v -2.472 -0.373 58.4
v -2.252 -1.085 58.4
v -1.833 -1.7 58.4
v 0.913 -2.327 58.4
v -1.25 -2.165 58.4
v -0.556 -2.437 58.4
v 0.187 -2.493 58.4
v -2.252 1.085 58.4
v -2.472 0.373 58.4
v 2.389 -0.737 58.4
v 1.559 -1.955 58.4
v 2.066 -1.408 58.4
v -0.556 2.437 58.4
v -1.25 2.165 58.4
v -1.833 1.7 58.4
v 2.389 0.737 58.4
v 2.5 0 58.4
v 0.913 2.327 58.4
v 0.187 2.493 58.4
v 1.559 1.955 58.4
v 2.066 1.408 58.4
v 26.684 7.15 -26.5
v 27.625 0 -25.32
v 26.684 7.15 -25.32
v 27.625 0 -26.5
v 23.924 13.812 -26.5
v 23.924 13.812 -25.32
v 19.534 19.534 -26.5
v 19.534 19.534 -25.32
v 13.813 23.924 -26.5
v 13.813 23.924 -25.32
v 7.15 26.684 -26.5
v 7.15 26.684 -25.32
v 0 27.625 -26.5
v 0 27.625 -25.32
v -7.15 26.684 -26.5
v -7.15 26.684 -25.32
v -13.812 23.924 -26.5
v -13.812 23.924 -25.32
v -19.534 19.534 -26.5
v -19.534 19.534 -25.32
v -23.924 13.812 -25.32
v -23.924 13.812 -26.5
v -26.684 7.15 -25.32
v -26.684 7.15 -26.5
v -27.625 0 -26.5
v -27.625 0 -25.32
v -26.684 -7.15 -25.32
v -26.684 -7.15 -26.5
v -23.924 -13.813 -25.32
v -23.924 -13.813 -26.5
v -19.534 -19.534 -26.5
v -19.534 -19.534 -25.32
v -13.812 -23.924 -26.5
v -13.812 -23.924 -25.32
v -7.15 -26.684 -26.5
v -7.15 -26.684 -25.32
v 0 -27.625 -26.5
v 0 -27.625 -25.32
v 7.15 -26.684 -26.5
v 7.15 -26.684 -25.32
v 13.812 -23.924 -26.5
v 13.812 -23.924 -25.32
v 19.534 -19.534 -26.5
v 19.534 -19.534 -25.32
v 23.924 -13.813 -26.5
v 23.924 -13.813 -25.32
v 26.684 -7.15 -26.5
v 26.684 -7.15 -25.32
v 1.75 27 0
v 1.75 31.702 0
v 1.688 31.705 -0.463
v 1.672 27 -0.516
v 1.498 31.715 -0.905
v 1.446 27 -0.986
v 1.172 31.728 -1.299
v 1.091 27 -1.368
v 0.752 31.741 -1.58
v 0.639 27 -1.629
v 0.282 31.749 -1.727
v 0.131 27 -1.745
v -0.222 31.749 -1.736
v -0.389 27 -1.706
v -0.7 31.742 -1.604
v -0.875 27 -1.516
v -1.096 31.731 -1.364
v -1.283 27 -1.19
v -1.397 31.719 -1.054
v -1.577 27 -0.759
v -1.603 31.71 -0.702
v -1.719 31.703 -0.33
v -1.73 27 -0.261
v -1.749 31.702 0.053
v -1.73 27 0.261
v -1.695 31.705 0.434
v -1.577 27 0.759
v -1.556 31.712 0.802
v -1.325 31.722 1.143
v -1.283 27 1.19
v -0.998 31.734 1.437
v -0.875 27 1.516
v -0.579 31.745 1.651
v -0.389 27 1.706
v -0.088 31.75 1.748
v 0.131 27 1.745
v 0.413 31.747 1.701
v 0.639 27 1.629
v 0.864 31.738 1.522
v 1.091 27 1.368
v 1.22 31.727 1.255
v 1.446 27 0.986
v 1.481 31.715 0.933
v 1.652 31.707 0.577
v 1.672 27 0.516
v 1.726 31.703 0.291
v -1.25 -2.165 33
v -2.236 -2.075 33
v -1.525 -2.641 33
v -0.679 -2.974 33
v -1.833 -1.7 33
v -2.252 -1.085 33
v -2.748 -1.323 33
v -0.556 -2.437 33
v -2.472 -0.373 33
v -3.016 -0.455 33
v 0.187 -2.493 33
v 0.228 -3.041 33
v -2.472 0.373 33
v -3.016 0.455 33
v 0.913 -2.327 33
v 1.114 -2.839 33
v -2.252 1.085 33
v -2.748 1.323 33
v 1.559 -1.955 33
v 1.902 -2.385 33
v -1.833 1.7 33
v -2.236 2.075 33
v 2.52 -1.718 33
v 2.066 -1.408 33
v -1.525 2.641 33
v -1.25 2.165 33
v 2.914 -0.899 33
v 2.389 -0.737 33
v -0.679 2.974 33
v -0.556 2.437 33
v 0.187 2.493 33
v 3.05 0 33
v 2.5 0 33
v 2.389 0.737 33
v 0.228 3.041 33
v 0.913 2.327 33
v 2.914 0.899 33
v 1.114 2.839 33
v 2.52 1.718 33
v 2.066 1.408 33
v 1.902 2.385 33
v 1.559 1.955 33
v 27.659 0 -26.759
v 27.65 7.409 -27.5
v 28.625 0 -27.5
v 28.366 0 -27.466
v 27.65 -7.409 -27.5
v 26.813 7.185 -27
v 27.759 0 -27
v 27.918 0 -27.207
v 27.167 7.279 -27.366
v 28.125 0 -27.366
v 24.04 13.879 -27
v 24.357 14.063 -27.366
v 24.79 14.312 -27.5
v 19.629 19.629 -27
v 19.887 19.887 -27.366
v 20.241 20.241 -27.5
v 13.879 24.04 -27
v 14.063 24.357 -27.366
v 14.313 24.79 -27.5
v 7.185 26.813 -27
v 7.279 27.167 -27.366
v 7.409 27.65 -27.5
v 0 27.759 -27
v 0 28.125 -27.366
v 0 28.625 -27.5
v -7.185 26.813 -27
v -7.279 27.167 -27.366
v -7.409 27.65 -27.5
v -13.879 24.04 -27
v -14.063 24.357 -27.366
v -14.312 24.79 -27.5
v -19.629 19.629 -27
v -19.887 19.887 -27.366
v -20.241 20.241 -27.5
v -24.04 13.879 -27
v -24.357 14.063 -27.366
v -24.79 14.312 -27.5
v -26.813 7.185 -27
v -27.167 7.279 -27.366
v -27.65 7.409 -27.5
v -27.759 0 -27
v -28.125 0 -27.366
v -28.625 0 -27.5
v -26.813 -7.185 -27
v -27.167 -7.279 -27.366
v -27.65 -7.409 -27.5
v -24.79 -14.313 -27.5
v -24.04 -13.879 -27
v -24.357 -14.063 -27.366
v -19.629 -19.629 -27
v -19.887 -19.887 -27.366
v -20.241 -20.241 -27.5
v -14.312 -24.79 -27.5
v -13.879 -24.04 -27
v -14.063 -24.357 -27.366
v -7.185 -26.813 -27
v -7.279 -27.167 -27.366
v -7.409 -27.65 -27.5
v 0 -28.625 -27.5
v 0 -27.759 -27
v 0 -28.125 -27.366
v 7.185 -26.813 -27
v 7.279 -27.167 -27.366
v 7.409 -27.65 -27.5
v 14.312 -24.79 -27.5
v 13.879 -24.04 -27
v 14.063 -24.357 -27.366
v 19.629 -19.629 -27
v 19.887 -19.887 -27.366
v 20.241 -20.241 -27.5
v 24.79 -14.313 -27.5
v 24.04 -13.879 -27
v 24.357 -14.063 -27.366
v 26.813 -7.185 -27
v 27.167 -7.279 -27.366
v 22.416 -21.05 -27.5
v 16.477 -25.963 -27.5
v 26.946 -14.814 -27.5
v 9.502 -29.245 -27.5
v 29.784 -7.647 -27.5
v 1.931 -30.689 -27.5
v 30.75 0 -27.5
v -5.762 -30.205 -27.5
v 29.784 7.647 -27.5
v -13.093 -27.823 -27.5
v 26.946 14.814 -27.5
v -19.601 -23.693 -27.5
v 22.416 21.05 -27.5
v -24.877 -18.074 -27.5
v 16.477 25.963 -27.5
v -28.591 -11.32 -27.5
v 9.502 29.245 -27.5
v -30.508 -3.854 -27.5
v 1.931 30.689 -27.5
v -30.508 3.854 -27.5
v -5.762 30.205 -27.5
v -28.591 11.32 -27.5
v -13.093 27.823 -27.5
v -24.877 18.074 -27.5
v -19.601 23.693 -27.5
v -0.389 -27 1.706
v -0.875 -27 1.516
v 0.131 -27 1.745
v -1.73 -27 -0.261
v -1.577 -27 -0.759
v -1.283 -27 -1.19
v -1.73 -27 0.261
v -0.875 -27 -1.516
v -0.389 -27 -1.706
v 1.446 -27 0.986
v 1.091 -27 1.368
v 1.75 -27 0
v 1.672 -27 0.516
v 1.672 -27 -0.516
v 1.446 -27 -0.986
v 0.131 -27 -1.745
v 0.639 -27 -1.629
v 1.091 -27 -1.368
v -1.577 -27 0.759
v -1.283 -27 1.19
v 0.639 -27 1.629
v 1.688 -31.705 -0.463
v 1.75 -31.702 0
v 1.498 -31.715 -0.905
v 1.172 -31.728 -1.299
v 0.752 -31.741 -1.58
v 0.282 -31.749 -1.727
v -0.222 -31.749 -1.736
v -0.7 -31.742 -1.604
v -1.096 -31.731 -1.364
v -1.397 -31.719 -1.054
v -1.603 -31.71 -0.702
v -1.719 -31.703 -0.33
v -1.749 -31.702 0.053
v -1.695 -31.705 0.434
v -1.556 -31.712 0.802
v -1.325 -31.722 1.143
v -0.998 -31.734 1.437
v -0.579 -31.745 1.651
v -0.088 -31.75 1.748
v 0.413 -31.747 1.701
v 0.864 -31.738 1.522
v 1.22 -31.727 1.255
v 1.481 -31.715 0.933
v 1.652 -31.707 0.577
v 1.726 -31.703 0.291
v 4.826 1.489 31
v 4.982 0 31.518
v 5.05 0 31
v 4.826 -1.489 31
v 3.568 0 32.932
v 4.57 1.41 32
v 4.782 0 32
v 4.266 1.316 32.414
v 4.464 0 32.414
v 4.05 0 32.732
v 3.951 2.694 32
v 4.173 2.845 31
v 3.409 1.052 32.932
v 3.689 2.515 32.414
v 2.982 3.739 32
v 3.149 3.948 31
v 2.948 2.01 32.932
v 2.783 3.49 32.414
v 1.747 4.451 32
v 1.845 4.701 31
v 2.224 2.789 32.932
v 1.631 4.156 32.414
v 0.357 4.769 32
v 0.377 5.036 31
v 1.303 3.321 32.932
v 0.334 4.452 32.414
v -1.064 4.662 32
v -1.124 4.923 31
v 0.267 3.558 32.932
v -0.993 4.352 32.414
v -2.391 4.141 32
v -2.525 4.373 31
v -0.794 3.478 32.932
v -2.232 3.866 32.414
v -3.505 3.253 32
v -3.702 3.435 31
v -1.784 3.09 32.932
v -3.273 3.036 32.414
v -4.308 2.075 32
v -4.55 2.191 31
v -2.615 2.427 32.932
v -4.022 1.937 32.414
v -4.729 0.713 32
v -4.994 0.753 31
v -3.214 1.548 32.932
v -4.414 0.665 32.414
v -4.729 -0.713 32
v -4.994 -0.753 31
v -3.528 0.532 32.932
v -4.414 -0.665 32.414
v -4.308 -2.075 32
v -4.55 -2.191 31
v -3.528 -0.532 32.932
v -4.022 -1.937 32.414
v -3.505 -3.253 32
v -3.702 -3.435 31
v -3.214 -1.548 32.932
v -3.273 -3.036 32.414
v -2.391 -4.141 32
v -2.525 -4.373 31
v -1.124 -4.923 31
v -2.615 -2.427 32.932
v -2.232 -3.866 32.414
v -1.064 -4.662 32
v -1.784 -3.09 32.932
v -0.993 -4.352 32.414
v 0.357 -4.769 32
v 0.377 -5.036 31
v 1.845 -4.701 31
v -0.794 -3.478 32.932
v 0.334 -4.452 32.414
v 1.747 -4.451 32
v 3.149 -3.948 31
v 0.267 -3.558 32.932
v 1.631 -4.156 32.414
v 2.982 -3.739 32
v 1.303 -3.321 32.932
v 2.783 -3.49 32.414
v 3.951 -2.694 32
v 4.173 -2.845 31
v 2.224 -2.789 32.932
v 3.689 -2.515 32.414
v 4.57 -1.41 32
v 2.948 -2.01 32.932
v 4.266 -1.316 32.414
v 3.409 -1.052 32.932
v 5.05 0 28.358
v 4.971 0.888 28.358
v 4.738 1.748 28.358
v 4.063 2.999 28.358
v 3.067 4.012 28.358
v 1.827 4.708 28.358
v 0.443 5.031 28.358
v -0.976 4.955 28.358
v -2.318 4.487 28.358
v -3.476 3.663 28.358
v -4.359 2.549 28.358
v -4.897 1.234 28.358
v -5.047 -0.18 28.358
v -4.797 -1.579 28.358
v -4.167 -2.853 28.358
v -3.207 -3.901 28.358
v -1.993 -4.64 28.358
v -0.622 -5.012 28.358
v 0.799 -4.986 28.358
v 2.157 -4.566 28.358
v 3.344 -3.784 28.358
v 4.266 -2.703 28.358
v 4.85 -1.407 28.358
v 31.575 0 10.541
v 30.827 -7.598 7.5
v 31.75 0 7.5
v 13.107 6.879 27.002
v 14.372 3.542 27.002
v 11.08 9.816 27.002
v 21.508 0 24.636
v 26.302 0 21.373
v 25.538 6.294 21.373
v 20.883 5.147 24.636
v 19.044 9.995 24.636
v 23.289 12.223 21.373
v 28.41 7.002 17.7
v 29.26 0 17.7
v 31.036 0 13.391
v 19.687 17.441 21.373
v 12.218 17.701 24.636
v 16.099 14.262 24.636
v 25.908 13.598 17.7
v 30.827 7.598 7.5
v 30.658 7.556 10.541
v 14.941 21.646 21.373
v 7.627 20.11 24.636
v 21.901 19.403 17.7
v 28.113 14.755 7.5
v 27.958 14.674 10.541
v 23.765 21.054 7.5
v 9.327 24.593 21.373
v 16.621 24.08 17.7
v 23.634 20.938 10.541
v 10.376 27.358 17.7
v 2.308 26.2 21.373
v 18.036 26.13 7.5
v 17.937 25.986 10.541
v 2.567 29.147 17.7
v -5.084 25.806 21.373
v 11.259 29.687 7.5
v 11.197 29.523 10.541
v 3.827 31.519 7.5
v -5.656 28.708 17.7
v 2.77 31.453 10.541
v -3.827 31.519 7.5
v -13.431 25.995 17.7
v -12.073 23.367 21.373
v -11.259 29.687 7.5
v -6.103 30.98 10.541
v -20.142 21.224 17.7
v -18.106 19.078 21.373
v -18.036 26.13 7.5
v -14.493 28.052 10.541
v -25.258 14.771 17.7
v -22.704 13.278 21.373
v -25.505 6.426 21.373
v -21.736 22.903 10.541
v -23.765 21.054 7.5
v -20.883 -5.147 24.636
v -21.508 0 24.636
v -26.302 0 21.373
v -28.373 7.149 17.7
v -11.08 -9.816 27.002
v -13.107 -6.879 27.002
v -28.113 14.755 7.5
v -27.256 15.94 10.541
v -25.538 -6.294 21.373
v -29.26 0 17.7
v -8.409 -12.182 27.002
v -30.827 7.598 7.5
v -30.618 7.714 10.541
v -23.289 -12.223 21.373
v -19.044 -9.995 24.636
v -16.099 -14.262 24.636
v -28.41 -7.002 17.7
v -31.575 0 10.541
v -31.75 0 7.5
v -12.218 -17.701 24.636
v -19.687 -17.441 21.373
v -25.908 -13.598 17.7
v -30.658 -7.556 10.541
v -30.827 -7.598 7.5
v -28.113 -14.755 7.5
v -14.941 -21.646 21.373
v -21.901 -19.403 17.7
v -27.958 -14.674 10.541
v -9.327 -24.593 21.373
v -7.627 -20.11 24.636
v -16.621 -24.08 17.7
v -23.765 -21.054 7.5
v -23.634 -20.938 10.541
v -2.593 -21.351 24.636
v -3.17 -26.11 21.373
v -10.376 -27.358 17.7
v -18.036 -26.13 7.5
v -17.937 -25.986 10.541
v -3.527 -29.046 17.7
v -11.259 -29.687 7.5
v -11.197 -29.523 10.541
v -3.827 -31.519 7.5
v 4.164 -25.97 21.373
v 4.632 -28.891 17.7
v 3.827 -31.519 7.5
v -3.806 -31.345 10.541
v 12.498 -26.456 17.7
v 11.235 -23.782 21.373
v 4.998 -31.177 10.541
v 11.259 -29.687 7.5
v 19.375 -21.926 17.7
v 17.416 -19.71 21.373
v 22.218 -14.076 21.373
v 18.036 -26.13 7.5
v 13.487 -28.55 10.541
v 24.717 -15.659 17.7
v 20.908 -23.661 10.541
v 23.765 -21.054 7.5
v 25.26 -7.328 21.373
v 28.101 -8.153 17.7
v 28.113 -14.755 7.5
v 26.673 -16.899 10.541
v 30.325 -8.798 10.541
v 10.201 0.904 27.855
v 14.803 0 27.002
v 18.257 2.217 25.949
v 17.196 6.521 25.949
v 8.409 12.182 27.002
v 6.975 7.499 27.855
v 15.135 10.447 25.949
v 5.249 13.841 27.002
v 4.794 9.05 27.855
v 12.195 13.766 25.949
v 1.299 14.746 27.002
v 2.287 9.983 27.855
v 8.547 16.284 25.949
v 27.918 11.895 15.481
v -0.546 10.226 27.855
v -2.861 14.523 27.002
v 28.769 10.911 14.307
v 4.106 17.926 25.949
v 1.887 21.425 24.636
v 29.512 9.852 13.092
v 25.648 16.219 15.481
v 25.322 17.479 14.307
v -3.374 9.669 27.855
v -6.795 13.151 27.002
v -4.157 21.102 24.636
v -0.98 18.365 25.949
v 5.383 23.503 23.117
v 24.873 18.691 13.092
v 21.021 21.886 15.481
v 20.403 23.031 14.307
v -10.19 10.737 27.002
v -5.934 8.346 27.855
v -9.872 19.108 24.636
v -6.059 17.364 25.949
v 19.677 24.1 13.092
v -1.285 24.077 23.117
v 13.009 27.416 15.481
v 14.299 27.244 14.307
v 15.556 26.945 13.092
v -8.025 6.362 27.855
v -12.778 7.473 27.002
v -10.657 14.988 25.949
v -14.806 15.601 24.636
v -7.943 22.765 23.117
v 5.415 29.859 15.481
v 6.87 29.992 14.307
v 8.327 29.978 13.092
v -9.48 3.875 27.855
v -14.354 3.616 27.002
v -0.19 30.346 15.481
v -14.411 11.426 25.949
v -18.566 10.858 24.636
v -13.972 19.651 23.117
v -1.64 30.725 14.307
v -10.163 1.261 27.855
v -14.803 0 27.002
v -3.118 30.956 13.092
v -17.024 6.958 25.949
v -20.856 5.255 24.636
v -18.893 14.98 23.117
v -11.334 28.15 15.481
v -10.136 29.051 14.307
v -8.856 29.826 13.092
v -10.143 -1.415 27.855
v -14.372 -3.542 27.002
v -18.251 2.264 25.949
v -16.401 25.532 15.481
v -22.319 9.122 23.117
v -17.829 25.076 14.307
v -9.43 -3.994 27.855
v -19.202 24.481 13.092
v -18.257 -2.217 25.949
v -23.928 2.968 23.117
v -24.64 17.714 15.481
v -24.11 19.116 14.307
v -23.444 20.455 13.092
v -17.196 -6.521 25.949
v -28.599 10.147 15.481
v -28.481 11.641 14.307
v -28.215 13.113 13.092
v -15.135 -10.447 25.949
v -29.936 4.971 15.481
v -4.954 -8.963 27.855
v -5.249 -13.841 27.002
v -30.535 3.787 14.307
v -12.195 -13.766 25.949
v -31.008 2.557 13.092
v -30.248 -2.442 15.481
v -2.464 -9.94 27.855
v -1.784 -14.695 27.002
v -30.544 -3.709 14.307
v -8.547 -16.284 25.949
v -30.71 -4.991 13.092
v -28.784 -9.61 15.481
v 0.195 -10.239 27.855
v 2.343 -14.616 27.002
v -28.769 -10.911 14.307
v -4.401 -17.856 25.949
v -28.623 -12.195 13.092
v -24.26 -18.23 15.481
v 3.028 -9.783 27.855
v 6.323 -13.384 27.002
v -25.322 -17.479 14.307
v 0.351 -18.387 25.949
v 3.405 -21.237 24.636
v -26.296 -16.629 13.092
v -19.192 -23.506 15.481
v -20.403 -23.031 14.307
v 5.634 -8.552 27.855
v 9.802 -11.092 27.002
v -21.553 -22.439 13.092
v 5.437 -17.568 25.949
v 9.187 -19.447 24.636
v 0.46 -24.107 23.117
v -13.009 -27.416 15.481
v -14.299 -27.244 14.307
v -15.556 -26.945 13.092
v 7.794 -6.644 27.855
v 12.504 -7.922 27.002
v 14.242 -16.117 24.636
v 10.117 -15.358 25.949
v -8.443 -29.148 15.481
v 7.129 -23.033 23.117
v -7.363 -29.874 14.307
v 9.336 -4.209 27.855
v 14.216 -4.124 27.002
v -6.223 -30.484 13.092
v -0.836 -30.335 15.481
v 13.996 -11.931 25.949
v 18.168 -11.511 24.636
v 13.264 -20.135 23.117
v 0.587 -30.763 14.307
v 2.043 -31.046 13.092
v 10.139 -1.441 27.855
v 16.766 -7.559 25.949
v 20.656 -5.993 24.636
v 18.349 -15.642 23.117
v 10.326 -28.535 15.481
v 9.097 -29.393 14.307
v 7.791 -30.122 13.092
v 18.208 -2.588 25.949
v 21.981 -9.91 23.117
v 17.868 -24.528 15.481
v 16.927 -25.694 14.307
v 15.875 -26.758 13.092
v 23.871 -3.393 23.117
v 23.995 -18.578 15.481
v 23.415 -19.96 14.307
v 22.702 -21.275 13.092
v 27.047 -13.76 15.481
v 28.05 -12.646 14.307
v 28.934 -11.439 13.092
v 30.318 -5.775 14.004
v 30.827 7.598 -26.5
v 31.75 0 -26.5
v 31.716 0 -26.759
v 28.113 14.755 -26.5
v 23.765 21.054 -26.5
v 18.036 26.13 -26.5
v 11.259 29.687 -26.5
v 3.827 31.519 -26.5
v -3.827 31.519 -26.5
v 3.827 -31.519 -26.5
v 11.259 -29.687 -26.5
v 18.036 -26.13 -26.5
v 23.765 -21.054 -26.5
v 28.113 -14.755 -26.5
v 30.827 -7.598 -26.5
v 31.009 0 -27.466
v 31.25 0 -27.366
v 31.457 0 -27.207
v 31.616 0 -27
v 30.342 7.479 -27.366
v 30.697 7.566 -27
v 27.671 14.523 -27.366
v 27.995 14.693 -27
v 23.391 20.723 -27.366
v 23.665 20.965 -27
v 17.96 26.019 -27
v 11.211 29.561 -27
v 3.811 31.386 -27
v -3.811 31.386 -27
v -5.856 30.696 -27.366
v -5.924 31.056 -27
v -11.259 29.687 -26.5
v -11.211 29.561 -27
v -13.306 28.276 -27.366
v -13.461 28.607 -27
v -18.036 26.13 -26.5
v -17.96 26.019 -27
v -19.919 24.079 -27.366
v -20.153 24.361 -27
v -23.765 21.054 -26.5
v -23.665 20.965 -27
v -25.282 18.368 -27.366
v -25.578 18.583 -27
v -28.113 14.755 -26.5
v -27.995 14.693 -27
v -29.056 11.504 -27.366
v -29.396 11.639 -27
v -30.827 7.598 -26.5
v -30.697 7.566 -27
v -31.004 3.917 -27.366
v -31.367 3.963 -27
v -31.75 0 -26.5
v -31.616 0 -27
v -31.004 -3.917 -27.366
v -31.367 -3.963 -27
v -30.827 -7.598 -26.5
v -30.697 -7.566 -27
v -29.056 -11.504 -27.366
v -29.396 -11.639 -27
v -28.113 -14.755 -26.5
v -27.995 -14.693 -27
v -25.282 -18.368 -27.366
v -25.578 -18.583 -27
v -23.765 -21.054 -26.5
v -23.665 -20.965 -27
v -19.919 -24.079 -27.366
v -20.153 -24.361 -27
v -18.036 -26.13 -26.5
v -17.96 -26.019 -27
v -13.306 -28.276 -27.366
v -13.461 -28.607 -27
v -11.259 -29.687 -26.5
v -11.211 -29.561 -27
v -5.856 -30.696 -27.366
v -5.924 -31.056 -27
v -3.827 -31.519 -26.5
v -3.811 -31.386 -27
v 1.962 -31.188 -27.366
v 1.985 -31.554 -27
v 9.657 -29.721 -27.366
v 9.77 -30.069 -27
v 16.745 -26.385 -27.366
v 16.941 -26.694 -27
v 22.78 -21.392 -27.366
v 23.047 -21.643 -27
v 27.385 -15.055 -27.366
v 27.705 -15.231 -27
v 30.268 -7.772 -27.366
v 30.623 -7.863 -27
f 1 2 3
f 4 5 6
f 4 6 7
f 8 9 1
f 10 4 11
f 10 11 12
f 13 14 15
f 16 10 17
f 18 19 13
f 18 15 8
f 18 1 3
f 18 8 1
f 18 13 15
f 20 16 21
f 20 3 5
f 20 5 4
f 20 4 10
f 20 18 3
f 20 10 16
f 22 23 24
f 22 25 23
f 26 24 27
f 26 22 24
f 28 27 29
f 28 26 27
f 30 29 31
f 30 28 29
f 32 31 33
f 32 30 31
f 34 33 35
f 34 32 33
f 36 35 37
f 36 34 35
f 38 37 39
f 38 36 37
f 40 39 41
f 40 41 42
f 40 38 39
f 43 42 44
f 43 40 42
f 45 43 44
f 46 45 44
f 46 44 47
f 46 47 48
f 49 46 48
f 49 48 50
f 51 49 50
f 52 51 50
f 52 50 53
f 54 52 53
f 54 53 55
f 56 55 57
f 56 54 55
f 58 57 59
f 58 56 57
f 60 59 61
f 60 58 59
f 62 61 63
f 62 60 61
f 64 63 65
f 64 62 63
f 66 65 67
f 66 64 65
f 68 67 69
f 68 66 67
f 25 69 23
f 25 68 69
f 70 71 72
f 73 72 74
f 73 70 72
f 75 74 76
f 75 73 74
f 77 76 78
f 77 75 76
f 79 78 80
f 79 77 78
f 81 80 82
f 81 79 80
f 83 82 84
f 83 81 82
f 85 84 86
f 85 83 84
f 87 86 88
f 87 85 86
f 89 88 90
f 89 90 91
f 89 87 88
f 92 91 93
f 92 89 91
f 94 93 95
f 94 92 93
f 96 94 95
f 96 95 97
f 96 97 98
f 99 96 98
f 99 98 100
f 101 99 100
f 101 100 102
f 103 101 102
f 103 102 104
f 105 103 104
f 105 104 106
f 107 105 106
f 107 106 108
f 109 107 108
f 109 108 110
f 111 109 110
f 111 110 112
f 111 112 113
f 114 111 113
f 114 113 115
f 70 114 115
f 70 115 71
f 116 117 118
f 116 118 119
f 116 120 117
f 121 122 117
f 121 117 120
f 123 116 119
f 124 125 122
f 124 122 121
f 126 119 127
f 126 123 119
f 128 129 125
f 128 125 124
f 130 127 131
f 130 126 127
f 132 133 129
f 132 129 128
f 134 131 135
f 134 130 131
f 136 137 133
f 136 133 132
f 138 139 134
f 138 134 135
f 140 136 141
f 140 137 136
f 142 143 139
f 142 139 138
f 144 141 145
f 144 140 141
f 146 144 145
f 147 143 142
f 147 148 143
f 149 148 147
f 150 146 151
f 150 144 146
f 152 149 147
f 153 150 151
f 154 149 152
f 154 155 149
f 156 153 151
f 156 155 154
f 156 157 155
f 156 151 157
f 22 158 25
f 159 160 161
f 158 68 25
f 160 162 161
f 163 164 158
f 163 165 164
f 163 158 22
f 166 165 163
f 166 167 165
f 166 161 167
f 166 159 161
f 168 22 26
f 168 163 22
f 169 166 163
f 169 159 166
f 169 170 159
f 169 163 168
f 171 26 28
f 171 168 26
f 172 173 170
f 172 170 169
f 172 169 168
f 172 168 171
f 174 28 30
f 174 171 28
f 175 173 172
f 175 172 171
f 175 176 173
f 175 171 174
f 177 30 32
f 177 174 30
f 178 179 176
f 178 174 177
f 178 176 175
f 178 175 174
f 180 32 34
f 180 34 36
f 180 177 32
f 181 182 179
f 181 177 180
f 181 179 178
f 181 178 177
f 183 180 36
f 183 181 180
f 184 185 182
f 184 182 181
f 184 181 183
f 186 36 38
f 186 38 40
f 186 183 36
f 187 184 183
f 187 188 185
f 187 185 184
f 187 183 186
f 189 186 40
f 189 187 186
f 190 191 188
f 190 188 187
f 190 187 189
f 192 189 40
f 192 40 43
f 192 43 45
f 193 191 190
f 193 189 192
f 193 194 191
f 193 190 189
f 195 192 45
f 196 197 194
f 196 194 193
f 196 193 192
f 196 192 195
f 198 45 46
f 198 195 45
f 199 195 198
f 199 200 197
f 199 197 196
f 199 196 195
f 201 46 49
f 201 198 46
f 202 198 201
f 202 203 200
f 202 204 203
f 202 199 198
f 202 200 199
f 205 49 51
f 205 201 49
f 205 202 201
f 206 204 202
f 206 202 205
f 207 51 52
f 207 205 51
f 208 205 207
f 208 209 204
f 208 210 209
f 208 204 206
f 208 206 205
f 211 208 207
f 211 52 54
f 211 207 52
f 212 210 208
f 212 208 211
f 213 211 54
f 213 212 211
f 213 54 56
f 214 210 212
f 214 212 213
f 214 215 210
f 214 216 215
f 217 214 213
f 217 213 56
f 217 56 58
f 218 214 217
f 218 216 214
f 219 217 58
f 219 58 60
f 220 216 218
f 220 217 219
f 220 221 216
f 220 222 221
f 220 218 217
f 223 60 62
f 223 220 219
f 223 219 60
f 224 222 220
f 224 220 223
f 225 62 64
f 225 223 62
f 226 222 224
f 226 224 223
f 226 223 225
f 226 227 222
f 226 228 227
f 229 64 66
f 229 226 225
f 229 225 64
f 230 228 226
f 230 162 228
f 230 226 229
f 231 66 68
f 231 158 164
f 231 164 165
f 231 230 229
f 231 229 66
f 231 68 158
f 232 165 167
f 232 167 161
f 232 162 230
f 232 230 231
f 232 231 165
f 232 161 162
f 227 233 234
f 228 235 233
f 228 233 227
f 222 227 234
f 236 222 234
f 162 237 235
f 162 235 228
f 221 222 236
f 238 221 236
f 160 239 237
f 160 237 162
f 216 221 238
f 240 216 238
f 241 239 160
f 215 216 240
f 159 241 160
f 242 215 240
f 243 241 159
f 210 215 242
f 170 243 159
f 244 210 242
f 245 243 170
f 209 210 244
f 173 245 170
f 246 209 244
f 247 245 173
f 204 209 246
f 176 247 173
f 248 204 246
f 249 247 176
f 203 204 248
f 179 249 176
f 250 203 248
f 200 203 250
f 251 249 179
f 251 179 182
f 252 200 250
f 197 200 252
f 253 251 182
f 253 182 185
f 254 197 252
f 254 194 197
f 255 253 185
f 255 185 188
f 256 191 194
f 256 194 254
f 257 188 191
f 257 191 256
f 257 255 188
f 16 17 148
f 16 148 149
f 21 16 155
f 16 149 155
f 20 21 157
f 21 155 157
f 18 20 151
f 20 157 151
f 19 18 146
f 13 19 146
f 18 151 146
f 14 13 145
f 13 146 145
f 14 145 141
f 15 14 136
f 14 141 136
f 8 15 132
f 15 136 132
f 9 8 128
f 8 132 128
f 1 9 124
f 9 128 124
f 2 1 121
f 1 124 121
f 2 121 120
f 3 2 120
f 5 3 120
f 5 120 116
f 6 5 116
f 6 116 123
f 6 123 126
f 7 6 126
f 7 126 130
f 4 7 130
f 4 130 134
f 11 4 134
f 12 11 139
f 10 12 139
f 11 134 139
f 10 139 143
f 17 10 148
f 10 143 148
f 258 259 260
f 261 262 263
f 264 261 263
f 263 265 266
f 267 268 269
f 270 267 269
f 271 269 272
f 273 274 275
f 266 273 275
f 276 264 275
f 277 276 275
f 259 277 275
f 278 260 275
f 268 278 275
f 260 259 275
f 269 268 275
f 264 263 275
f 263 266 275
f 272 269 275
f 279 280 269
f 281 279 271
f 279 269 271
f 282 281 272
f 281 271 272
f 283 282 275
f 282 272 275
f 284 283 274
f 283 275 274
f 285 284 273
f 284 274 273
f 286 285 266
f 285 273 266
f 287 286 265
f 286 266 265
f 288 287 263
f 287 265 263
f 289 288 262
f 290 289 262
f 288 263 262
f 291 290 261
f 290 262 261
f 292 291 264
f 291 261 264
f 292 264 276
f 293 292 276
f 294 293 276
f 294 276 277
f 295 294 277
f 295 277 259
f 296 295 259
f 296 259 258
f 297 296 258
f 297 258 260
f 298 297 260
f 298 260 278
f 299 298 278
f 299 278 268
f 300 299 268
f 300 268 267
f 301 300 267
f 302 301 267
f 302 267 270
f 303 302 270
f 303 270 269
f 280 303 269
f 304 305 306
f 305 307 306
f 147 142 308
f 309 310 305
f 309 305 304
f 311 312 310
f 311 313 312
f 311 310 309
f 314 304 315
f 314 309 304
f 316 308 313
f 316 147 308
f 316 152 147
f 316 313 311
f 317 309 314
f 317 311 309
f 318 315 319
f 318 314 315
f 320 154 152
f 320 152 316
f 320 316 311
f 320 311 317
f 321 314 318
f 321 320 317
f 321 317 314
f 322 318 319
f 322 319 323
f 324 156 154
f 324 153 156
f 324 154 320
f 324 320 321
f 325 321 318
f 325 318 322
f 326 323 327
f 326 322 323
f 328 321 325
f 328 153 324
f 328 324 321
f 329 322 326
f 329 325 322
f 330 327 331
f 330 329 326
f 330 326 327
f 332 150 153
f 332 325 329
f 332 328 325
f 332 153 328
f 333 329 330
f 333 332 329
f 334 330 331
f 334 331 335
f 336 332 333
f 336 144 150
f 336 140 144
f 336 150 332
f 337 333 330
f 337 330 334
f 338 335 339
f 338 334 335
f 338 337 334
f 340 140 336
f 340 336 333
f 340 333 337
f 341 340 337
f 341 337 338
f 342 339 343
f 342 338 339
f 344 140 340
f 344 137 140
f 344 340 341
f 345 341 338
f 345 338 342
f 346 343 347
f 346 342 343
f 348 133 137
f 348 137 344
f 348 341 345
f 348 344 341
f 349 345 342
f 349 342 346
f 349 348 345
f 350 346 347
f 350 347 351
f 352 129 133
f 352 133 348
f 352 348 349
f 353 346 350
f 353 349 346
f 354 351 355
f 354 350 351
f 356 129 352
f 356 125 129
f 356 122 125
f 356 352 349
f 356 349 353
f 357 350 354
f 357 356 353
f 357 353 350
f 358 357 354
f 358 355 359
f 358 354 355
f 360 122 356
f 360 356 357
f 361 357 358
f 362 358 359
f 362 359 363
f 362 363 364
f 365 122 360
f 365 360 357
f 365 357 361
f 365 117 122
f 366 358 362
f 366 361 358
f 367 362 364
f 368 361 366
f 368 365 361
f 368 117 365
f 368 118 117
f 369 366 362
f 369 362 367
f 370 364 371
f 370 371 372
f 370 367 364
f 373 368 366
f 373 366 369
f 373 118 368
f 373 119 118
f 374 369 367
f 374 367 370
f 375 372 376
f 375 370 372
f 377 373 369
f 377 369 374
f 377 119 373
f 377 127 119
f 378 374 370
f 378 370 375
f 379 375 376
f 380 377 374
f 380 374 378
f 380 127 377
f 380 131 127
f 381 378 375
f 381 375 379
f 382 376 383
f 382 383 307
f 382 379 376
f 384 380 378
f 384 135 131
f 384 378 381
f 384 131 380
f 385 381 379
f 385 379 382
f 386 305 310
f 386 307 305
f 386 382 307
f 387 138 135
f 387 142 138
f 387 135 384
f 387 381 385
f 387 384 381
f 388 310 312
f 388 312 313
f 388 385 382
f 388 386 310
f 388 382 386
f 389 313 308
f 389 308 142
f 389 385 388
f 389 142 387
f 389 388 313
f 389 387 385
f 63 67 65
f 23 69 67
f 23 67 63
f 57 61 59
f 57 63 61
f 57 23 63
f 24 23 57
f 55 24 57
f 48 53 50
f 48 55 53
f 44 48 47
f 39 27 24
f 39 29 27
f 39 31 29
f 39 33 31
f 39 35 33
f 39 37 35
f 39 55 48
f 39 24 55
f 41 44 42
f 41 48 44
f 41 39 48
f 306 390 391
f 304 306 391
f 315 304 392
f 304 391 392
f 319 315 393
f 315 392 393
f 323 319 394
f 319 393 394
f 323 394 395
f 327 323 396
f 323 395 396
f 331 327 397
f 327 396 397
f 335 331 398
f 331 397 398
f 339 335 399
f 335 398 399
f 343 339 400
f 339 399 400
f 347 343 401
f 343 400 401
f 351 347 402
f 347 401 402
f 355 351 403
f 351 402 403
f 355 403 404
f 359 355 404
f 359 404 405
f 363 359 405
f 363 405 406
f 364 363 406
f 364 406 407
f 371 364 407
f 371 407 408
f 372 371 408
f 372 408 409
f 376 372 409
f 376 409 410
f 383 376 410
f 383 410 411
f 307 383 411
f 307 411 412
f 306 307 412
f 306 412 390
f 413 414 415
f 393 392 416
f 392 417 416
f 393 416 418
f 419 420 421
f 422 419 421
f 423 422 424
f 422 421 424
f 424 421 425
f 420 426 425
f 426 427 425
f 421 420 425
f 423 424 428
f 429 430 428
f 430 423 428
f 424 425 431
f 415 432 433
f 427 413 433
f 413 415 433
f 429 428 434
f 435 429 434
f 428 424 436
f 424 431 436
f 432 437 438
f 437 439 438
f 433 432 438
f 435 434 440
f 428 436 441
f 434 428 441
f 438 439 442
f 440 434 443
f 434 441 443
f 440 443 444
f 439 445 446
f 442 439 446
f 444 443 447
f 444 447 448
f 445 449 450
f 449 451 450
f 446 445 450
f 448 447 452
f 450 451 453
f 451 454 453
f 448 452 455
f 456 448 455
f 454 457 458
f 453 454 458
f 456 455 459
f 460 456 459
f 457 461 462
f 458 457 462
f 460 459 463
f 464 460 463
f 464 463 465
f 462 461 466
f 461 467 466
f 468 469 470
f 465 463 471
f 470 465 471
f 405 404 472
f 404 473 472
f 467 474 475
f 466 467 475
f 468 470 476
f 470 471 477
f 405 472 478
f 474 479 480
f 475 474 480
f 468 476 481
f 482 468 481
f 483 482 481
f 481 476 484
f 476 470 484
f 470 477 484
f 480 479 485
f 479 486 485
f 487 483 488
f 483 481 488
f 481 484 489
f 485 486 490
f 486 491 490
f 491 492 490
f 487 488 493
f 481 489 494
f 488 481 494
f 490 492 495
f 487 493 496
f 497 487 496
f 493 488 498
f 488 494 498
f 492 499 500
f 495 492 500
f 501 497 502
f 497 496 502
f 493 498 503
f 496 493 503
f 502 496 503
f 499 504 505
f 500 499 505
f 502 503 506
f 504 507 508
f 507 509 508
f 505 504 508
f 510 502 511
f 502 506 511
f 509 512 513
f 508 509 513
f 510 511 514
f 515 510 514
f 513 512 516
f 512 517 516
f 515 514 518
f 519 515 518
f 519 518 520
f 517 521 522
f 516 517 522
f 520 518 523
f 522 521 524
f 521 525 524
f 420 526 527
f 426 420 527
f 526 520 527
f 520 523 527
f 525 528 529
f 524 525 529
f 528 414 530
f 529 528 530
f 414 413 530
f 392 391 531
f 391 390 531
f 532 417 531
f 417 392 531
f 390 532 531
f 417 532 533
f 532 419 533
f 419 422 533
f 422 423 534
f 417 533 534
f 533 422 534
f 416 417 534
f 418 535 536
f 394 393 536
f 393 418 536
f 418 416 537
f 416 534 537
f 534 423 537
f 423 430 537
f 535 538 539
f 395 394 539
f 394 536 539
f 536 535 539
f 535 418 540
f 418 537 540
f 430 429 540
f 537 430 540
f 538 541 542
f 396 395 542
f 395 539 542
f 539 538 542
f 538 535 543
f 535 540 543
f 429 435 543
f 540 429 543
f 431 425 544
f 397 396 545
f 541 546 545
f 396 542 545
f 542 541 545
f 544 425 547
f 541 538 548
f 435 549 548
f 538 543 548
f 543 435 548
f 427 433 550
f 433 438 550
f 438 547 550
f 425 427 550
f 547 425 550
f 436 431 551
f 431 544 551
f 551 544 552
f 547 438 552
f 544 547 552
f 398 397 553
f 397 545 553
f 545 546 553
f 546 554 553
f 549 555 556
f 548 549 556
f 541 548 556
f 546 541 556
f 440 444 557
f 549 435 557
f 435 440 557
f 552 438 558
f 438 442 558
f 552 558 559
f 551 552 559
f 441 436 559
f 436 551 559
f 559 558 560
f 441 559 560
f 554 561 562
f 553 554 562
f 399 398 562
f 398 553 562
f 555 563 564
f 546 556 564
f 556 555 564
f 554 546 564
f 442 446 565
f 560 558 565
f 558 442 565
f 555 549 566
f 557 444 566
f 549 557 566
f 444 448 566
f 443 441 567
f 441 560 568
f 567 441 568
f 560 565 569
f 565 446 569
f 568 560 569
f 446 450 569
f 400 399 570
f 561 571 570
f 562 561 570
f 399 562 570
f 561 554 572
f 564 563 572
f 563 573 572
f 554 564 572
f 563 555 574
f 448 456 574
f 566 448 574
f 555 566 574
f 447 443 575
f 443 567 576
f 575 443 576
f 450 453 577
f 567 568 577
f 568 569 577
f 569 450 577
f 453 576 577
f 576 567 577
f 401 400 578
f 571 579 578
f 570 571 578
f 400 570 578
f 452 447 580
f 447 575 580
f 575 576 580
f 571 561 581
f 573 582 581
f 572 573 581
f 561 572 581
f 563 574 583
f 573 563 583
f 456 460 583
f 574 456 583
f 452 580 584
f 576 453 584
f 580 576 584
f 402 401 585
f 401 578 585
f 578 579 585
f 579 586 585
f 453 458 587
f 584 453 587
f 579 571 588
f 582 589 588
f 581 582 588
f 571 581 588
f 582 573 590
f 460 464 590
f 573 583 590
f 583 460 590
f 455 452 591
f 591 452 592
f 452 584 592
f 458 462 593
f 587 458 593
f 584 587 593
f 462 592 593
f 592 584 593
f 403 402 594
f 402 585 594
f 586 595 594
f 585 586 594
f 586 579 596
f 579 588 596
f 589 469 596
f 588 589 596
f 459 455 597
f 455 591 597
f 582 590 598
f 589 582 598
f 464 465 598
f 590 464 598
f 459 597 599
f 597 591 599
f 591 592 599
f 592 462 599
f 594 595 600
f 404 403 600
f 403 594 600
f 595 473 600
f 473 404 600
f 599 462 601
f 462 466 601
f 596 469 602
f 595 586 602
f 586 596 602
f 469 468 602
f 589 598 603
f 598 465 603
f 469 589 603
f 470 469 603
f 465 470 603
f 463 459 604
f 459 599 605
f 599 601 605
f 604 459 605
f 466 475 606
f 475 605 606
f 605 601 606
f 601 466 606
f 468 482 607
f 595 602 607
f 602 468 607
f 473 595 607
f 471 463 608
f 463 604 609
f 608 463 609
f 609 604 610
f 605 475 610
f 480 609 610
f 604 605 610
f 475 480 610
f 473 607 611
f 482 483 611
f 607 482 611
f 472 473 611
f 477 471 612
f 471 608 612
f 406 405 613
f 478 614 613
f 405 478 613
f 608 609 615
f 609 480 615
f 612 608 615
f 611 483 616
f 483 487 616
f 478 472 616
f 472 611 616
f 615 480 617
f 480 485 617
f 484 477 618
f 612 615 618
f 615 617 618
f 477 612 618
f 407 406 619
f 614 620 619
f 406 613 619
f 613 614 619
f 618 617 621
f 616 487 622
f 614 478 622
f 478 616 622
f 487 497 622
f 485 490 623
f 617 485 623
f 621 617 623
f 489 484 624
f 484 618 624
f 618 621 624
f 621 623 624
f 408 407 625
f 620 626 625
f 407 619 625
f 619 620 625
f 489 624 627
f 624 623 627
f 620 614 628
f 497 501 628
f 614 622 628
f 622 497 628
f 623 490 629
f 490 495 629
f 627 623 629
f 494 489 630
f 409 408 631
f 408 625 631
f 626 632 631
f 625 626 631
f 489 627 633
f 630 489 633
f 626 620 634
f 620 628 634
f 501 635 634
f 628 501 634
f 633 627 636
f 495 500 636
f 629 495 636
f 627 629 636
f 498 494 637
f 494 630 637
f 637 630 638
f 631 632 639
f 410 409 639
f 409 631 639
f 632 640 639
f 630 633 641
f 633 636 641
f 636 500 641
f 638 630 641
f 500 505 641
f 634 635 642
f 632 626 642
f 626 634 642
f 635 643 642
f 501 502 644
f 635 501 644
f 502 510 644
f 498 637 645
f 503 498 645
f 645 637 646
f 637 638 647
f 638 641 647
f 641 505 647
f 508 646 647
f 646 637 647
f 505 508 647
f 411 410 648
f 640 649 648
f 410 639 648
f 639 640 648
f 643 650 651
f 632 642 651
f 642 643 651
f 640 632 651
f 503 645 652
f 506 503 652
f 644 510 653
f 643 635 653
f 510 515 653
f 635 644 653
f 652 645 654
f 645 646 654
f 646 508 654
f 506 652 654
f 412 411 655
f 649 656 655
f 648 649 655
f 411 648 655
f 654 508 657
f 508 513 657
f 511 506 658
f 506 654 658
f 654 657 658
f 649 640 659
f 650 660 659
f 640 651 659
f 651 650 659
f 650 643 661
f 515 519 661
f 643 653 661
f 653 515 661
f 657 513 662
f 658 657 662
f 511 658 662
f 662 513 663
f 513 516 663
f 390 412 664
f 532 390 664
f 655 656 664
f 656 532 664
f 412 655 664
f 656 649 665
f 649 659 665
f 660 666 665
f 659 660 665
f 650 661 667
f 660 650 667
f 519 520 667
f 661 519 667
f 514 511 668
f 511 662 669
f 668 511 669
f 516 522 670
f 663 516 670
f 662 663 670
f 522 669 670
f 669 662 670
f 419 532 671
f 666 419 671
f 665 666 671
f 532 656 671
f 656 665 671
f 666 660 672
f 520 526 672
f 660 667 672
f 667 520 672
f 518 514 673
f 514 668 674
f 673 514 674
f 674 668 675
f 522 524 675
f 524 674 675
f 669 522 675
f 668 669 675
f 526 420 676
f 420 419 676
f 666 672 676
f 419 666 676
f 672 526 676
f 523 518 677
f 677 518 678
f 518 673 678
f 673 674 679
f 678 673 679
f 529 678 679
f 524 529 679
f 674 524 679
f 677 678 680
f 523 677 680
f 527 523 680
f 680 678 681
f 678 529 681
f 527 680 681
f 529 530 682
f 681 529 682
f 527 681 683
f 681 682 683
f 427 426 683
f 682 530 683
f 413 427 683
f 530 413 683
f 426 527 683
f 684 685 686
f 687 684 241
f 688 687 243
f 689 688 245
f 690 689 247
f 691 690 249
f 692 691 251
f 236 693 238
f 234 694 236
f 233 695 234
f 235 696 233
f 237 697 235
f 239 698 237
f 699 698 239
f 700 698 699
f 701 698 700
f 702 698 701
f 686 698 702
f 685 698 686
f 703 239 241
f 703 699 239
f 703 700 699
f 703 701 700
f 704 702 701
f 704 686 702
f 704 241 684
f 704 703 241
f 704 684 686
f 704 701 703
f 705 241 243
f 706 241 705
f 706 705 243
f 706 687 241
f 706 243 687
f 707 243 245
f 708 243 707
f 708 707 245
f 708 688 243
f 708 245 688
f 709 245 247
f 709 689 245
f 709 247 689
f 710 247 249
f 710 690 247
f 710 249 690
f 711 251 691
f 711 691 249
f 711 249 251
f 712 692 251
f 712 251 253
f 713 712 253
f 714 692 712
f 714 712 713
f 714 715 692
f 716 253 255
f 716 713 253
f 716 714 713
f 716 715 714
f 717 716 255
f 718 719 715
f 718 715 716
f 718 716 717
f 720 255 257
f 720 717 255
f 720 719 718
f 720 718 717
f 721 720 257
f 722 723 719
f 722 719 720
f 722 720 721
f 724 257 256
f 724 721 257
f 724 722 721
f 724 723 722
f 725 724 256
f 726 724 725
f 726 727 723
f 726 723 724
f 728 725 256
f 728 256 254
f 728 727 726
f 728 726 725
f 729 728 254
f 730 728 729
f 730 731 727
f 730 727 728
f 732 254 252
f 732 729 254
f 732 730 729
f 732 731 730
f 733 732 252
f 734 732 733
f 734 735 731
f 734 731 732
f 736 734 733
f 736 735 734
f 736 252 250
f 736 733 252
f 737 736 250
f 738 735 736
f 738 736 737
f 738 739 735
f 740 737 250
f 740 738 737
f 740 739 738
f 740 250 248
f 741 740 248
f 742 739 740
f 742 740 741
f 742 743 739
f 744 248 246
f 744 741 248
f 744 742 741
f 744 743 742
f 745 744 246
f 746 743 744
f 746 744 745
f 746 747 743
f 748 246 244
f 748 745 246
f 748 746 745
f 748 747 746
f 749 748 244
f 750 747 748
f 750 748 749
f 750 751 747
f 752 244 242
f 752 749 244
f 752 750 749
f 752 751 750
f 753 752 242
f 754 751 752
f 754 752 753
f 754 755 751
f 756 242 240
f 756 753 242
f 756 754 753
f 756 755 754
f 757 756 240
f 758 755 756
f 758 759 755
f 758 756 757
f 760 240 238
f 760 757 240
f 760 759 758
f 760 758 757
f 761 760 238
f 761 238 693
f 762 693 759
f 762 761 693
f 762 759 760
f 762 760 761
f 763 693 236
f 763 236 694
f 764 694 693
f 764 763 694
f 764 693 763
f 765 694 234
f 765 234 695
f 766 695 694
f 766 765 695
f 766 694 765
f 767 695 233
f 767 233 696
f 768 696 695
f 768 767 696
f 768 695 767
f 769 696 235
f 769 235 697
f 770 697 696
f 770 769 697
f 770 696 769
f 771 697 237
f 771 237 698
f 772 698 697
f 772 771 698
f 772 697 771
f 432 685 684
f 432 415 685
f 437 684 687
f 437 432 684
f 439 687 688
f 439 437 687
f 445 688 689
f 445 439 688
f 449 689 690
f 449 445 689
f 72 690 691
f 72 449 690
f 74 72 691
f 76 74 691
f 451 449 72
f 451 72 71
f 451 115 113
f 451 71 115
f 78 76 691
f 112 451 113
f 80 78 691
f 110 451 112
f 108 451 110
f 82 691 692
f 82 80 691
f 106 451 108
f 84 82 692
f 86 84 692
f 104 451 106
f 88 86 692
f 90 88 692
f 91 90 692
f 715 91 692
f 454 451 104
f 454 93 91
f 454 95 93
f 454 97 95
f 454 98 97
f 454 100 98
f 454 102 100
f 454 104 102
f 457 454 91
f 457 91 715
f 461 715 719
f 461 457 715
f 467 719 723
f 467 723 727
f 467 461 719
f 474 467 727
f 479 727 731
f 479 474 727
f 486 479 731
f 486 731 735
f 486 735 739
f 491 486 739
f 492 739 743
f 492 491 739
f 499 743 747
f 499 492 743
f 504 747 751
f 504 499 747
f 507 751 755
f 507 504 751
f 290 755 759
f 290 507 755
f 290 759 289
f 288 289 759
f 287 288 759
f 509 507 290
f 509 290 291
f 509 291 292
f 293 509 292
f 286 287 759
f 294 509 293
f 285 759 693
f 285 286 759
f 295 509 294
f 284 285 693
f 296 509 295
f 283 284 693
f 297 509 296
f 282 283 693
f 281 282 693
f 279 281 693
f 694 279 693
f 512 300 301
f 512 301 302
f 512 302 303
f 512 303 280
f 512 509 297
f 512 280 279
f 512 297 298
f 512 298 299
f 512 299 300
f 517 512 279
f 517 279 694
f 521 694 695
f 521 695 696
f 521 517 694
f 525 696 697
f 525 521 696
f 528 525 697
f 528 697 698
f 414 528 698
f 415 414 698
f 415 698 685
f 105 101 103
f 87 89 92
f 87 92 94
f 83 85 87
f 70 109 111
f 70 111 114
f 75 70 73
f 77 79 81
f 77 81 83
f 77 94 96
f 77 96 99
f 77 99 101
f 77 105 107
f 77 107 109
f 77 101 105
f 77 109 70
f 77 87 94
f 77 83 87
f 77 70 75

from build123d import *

# Parameters (mm, degrees)
CUT_EXTRUDE1_START  = -27
SKETCH6_R           = 1.75
CUT_EXTRUDE1_DEPTH  = 5.7500001
SKETCH7_R           = 5.05
BOSS_EXTRUDE2_DEPTH = 8
FILLET1_R           = 2
SKETCH8_R           = 2.5
BOSS_EXTRUDE3_DEPTH = 25.4


with BuildPart() as part:
    # Sketch3 → Revolve1 (revolve)
    with BuildSketch(Plane(origin=(0, 0, 0), x_dir=(1, 0, 0), z_dir=(0, 1, 0))):
        with BuildLine():
            Line((0, 25.32), (27.625, 25.32))
            Line((27.625, 25.32), (27.625, 26.5))
            ThreePointArc((27.625, 26.5), (27.917893219, 27.207106781), (28.625, 27.5))
            Line((28.625, 27.5), (30.75, 27.5))
            ThreePointArc((30.75, 27.5), (31.457106781, 27.207106781), (31.75, 26.5))
            Line((31.75, 26.5), (31.75, -7.5))
            add(Edge.make_bspline(
                [(0, -28.5), (23.295574904, -28.5), (31.75, -20.206509843), (31.75, -7.5)],
                knots=[0, 0, 0, 0, 1, 1, 1, 1], degree=3))
            Line((0, -28.5), (0, 25.32))
        make_face()
    revolve(axis=Axis((0, 0, -65.333333333), (0, 0, 1)))

    # Sketch6 → Cut-Extrude1 (cut, through all)
    with BuildSketch(Plane(origin=(0, 0, 0), x_dir=(1, 0, 0), z_dir=(0, 1, 0)).offset(CUT_EXTRUDE1_START)):
        Circle(SKETCH6_R)
    cut_extrude1 = extrude(amount=-CUT_EXTRUDE1_DEPTH, mode=Mode.SUBTRACT)

    # Mirror1: Cut-Extrude1 across plane
    add(cut_extrude1.mirror(Plane.ZX), mode=Mode.SUBTRACT)

    # Sketch7 → Boss-Extrude2 (add)
    with BuildSketch(Plane.XY.offset(25)):
        Circle(SKETCH7_R)
    extrude(amount=BOSS_EXTRUDE2_DEPTH)

    # Fillet1
    fillet1_edges = [part.edges().sort_by_distance(p)[0] for p in [
        (-5.05, 0, 33),
    ]]
    fillet(fillet1_edges, radius=FILLET1_R)

    # Sketch8 → Boss-Extrude3 (add)
    with BuildSketch(Plane.XY.offset(33)):
        Circle(SKETCH8_R)
    extrude(amount=BOSS_EXTRUDE3_DEPTH)


solid = part.part
